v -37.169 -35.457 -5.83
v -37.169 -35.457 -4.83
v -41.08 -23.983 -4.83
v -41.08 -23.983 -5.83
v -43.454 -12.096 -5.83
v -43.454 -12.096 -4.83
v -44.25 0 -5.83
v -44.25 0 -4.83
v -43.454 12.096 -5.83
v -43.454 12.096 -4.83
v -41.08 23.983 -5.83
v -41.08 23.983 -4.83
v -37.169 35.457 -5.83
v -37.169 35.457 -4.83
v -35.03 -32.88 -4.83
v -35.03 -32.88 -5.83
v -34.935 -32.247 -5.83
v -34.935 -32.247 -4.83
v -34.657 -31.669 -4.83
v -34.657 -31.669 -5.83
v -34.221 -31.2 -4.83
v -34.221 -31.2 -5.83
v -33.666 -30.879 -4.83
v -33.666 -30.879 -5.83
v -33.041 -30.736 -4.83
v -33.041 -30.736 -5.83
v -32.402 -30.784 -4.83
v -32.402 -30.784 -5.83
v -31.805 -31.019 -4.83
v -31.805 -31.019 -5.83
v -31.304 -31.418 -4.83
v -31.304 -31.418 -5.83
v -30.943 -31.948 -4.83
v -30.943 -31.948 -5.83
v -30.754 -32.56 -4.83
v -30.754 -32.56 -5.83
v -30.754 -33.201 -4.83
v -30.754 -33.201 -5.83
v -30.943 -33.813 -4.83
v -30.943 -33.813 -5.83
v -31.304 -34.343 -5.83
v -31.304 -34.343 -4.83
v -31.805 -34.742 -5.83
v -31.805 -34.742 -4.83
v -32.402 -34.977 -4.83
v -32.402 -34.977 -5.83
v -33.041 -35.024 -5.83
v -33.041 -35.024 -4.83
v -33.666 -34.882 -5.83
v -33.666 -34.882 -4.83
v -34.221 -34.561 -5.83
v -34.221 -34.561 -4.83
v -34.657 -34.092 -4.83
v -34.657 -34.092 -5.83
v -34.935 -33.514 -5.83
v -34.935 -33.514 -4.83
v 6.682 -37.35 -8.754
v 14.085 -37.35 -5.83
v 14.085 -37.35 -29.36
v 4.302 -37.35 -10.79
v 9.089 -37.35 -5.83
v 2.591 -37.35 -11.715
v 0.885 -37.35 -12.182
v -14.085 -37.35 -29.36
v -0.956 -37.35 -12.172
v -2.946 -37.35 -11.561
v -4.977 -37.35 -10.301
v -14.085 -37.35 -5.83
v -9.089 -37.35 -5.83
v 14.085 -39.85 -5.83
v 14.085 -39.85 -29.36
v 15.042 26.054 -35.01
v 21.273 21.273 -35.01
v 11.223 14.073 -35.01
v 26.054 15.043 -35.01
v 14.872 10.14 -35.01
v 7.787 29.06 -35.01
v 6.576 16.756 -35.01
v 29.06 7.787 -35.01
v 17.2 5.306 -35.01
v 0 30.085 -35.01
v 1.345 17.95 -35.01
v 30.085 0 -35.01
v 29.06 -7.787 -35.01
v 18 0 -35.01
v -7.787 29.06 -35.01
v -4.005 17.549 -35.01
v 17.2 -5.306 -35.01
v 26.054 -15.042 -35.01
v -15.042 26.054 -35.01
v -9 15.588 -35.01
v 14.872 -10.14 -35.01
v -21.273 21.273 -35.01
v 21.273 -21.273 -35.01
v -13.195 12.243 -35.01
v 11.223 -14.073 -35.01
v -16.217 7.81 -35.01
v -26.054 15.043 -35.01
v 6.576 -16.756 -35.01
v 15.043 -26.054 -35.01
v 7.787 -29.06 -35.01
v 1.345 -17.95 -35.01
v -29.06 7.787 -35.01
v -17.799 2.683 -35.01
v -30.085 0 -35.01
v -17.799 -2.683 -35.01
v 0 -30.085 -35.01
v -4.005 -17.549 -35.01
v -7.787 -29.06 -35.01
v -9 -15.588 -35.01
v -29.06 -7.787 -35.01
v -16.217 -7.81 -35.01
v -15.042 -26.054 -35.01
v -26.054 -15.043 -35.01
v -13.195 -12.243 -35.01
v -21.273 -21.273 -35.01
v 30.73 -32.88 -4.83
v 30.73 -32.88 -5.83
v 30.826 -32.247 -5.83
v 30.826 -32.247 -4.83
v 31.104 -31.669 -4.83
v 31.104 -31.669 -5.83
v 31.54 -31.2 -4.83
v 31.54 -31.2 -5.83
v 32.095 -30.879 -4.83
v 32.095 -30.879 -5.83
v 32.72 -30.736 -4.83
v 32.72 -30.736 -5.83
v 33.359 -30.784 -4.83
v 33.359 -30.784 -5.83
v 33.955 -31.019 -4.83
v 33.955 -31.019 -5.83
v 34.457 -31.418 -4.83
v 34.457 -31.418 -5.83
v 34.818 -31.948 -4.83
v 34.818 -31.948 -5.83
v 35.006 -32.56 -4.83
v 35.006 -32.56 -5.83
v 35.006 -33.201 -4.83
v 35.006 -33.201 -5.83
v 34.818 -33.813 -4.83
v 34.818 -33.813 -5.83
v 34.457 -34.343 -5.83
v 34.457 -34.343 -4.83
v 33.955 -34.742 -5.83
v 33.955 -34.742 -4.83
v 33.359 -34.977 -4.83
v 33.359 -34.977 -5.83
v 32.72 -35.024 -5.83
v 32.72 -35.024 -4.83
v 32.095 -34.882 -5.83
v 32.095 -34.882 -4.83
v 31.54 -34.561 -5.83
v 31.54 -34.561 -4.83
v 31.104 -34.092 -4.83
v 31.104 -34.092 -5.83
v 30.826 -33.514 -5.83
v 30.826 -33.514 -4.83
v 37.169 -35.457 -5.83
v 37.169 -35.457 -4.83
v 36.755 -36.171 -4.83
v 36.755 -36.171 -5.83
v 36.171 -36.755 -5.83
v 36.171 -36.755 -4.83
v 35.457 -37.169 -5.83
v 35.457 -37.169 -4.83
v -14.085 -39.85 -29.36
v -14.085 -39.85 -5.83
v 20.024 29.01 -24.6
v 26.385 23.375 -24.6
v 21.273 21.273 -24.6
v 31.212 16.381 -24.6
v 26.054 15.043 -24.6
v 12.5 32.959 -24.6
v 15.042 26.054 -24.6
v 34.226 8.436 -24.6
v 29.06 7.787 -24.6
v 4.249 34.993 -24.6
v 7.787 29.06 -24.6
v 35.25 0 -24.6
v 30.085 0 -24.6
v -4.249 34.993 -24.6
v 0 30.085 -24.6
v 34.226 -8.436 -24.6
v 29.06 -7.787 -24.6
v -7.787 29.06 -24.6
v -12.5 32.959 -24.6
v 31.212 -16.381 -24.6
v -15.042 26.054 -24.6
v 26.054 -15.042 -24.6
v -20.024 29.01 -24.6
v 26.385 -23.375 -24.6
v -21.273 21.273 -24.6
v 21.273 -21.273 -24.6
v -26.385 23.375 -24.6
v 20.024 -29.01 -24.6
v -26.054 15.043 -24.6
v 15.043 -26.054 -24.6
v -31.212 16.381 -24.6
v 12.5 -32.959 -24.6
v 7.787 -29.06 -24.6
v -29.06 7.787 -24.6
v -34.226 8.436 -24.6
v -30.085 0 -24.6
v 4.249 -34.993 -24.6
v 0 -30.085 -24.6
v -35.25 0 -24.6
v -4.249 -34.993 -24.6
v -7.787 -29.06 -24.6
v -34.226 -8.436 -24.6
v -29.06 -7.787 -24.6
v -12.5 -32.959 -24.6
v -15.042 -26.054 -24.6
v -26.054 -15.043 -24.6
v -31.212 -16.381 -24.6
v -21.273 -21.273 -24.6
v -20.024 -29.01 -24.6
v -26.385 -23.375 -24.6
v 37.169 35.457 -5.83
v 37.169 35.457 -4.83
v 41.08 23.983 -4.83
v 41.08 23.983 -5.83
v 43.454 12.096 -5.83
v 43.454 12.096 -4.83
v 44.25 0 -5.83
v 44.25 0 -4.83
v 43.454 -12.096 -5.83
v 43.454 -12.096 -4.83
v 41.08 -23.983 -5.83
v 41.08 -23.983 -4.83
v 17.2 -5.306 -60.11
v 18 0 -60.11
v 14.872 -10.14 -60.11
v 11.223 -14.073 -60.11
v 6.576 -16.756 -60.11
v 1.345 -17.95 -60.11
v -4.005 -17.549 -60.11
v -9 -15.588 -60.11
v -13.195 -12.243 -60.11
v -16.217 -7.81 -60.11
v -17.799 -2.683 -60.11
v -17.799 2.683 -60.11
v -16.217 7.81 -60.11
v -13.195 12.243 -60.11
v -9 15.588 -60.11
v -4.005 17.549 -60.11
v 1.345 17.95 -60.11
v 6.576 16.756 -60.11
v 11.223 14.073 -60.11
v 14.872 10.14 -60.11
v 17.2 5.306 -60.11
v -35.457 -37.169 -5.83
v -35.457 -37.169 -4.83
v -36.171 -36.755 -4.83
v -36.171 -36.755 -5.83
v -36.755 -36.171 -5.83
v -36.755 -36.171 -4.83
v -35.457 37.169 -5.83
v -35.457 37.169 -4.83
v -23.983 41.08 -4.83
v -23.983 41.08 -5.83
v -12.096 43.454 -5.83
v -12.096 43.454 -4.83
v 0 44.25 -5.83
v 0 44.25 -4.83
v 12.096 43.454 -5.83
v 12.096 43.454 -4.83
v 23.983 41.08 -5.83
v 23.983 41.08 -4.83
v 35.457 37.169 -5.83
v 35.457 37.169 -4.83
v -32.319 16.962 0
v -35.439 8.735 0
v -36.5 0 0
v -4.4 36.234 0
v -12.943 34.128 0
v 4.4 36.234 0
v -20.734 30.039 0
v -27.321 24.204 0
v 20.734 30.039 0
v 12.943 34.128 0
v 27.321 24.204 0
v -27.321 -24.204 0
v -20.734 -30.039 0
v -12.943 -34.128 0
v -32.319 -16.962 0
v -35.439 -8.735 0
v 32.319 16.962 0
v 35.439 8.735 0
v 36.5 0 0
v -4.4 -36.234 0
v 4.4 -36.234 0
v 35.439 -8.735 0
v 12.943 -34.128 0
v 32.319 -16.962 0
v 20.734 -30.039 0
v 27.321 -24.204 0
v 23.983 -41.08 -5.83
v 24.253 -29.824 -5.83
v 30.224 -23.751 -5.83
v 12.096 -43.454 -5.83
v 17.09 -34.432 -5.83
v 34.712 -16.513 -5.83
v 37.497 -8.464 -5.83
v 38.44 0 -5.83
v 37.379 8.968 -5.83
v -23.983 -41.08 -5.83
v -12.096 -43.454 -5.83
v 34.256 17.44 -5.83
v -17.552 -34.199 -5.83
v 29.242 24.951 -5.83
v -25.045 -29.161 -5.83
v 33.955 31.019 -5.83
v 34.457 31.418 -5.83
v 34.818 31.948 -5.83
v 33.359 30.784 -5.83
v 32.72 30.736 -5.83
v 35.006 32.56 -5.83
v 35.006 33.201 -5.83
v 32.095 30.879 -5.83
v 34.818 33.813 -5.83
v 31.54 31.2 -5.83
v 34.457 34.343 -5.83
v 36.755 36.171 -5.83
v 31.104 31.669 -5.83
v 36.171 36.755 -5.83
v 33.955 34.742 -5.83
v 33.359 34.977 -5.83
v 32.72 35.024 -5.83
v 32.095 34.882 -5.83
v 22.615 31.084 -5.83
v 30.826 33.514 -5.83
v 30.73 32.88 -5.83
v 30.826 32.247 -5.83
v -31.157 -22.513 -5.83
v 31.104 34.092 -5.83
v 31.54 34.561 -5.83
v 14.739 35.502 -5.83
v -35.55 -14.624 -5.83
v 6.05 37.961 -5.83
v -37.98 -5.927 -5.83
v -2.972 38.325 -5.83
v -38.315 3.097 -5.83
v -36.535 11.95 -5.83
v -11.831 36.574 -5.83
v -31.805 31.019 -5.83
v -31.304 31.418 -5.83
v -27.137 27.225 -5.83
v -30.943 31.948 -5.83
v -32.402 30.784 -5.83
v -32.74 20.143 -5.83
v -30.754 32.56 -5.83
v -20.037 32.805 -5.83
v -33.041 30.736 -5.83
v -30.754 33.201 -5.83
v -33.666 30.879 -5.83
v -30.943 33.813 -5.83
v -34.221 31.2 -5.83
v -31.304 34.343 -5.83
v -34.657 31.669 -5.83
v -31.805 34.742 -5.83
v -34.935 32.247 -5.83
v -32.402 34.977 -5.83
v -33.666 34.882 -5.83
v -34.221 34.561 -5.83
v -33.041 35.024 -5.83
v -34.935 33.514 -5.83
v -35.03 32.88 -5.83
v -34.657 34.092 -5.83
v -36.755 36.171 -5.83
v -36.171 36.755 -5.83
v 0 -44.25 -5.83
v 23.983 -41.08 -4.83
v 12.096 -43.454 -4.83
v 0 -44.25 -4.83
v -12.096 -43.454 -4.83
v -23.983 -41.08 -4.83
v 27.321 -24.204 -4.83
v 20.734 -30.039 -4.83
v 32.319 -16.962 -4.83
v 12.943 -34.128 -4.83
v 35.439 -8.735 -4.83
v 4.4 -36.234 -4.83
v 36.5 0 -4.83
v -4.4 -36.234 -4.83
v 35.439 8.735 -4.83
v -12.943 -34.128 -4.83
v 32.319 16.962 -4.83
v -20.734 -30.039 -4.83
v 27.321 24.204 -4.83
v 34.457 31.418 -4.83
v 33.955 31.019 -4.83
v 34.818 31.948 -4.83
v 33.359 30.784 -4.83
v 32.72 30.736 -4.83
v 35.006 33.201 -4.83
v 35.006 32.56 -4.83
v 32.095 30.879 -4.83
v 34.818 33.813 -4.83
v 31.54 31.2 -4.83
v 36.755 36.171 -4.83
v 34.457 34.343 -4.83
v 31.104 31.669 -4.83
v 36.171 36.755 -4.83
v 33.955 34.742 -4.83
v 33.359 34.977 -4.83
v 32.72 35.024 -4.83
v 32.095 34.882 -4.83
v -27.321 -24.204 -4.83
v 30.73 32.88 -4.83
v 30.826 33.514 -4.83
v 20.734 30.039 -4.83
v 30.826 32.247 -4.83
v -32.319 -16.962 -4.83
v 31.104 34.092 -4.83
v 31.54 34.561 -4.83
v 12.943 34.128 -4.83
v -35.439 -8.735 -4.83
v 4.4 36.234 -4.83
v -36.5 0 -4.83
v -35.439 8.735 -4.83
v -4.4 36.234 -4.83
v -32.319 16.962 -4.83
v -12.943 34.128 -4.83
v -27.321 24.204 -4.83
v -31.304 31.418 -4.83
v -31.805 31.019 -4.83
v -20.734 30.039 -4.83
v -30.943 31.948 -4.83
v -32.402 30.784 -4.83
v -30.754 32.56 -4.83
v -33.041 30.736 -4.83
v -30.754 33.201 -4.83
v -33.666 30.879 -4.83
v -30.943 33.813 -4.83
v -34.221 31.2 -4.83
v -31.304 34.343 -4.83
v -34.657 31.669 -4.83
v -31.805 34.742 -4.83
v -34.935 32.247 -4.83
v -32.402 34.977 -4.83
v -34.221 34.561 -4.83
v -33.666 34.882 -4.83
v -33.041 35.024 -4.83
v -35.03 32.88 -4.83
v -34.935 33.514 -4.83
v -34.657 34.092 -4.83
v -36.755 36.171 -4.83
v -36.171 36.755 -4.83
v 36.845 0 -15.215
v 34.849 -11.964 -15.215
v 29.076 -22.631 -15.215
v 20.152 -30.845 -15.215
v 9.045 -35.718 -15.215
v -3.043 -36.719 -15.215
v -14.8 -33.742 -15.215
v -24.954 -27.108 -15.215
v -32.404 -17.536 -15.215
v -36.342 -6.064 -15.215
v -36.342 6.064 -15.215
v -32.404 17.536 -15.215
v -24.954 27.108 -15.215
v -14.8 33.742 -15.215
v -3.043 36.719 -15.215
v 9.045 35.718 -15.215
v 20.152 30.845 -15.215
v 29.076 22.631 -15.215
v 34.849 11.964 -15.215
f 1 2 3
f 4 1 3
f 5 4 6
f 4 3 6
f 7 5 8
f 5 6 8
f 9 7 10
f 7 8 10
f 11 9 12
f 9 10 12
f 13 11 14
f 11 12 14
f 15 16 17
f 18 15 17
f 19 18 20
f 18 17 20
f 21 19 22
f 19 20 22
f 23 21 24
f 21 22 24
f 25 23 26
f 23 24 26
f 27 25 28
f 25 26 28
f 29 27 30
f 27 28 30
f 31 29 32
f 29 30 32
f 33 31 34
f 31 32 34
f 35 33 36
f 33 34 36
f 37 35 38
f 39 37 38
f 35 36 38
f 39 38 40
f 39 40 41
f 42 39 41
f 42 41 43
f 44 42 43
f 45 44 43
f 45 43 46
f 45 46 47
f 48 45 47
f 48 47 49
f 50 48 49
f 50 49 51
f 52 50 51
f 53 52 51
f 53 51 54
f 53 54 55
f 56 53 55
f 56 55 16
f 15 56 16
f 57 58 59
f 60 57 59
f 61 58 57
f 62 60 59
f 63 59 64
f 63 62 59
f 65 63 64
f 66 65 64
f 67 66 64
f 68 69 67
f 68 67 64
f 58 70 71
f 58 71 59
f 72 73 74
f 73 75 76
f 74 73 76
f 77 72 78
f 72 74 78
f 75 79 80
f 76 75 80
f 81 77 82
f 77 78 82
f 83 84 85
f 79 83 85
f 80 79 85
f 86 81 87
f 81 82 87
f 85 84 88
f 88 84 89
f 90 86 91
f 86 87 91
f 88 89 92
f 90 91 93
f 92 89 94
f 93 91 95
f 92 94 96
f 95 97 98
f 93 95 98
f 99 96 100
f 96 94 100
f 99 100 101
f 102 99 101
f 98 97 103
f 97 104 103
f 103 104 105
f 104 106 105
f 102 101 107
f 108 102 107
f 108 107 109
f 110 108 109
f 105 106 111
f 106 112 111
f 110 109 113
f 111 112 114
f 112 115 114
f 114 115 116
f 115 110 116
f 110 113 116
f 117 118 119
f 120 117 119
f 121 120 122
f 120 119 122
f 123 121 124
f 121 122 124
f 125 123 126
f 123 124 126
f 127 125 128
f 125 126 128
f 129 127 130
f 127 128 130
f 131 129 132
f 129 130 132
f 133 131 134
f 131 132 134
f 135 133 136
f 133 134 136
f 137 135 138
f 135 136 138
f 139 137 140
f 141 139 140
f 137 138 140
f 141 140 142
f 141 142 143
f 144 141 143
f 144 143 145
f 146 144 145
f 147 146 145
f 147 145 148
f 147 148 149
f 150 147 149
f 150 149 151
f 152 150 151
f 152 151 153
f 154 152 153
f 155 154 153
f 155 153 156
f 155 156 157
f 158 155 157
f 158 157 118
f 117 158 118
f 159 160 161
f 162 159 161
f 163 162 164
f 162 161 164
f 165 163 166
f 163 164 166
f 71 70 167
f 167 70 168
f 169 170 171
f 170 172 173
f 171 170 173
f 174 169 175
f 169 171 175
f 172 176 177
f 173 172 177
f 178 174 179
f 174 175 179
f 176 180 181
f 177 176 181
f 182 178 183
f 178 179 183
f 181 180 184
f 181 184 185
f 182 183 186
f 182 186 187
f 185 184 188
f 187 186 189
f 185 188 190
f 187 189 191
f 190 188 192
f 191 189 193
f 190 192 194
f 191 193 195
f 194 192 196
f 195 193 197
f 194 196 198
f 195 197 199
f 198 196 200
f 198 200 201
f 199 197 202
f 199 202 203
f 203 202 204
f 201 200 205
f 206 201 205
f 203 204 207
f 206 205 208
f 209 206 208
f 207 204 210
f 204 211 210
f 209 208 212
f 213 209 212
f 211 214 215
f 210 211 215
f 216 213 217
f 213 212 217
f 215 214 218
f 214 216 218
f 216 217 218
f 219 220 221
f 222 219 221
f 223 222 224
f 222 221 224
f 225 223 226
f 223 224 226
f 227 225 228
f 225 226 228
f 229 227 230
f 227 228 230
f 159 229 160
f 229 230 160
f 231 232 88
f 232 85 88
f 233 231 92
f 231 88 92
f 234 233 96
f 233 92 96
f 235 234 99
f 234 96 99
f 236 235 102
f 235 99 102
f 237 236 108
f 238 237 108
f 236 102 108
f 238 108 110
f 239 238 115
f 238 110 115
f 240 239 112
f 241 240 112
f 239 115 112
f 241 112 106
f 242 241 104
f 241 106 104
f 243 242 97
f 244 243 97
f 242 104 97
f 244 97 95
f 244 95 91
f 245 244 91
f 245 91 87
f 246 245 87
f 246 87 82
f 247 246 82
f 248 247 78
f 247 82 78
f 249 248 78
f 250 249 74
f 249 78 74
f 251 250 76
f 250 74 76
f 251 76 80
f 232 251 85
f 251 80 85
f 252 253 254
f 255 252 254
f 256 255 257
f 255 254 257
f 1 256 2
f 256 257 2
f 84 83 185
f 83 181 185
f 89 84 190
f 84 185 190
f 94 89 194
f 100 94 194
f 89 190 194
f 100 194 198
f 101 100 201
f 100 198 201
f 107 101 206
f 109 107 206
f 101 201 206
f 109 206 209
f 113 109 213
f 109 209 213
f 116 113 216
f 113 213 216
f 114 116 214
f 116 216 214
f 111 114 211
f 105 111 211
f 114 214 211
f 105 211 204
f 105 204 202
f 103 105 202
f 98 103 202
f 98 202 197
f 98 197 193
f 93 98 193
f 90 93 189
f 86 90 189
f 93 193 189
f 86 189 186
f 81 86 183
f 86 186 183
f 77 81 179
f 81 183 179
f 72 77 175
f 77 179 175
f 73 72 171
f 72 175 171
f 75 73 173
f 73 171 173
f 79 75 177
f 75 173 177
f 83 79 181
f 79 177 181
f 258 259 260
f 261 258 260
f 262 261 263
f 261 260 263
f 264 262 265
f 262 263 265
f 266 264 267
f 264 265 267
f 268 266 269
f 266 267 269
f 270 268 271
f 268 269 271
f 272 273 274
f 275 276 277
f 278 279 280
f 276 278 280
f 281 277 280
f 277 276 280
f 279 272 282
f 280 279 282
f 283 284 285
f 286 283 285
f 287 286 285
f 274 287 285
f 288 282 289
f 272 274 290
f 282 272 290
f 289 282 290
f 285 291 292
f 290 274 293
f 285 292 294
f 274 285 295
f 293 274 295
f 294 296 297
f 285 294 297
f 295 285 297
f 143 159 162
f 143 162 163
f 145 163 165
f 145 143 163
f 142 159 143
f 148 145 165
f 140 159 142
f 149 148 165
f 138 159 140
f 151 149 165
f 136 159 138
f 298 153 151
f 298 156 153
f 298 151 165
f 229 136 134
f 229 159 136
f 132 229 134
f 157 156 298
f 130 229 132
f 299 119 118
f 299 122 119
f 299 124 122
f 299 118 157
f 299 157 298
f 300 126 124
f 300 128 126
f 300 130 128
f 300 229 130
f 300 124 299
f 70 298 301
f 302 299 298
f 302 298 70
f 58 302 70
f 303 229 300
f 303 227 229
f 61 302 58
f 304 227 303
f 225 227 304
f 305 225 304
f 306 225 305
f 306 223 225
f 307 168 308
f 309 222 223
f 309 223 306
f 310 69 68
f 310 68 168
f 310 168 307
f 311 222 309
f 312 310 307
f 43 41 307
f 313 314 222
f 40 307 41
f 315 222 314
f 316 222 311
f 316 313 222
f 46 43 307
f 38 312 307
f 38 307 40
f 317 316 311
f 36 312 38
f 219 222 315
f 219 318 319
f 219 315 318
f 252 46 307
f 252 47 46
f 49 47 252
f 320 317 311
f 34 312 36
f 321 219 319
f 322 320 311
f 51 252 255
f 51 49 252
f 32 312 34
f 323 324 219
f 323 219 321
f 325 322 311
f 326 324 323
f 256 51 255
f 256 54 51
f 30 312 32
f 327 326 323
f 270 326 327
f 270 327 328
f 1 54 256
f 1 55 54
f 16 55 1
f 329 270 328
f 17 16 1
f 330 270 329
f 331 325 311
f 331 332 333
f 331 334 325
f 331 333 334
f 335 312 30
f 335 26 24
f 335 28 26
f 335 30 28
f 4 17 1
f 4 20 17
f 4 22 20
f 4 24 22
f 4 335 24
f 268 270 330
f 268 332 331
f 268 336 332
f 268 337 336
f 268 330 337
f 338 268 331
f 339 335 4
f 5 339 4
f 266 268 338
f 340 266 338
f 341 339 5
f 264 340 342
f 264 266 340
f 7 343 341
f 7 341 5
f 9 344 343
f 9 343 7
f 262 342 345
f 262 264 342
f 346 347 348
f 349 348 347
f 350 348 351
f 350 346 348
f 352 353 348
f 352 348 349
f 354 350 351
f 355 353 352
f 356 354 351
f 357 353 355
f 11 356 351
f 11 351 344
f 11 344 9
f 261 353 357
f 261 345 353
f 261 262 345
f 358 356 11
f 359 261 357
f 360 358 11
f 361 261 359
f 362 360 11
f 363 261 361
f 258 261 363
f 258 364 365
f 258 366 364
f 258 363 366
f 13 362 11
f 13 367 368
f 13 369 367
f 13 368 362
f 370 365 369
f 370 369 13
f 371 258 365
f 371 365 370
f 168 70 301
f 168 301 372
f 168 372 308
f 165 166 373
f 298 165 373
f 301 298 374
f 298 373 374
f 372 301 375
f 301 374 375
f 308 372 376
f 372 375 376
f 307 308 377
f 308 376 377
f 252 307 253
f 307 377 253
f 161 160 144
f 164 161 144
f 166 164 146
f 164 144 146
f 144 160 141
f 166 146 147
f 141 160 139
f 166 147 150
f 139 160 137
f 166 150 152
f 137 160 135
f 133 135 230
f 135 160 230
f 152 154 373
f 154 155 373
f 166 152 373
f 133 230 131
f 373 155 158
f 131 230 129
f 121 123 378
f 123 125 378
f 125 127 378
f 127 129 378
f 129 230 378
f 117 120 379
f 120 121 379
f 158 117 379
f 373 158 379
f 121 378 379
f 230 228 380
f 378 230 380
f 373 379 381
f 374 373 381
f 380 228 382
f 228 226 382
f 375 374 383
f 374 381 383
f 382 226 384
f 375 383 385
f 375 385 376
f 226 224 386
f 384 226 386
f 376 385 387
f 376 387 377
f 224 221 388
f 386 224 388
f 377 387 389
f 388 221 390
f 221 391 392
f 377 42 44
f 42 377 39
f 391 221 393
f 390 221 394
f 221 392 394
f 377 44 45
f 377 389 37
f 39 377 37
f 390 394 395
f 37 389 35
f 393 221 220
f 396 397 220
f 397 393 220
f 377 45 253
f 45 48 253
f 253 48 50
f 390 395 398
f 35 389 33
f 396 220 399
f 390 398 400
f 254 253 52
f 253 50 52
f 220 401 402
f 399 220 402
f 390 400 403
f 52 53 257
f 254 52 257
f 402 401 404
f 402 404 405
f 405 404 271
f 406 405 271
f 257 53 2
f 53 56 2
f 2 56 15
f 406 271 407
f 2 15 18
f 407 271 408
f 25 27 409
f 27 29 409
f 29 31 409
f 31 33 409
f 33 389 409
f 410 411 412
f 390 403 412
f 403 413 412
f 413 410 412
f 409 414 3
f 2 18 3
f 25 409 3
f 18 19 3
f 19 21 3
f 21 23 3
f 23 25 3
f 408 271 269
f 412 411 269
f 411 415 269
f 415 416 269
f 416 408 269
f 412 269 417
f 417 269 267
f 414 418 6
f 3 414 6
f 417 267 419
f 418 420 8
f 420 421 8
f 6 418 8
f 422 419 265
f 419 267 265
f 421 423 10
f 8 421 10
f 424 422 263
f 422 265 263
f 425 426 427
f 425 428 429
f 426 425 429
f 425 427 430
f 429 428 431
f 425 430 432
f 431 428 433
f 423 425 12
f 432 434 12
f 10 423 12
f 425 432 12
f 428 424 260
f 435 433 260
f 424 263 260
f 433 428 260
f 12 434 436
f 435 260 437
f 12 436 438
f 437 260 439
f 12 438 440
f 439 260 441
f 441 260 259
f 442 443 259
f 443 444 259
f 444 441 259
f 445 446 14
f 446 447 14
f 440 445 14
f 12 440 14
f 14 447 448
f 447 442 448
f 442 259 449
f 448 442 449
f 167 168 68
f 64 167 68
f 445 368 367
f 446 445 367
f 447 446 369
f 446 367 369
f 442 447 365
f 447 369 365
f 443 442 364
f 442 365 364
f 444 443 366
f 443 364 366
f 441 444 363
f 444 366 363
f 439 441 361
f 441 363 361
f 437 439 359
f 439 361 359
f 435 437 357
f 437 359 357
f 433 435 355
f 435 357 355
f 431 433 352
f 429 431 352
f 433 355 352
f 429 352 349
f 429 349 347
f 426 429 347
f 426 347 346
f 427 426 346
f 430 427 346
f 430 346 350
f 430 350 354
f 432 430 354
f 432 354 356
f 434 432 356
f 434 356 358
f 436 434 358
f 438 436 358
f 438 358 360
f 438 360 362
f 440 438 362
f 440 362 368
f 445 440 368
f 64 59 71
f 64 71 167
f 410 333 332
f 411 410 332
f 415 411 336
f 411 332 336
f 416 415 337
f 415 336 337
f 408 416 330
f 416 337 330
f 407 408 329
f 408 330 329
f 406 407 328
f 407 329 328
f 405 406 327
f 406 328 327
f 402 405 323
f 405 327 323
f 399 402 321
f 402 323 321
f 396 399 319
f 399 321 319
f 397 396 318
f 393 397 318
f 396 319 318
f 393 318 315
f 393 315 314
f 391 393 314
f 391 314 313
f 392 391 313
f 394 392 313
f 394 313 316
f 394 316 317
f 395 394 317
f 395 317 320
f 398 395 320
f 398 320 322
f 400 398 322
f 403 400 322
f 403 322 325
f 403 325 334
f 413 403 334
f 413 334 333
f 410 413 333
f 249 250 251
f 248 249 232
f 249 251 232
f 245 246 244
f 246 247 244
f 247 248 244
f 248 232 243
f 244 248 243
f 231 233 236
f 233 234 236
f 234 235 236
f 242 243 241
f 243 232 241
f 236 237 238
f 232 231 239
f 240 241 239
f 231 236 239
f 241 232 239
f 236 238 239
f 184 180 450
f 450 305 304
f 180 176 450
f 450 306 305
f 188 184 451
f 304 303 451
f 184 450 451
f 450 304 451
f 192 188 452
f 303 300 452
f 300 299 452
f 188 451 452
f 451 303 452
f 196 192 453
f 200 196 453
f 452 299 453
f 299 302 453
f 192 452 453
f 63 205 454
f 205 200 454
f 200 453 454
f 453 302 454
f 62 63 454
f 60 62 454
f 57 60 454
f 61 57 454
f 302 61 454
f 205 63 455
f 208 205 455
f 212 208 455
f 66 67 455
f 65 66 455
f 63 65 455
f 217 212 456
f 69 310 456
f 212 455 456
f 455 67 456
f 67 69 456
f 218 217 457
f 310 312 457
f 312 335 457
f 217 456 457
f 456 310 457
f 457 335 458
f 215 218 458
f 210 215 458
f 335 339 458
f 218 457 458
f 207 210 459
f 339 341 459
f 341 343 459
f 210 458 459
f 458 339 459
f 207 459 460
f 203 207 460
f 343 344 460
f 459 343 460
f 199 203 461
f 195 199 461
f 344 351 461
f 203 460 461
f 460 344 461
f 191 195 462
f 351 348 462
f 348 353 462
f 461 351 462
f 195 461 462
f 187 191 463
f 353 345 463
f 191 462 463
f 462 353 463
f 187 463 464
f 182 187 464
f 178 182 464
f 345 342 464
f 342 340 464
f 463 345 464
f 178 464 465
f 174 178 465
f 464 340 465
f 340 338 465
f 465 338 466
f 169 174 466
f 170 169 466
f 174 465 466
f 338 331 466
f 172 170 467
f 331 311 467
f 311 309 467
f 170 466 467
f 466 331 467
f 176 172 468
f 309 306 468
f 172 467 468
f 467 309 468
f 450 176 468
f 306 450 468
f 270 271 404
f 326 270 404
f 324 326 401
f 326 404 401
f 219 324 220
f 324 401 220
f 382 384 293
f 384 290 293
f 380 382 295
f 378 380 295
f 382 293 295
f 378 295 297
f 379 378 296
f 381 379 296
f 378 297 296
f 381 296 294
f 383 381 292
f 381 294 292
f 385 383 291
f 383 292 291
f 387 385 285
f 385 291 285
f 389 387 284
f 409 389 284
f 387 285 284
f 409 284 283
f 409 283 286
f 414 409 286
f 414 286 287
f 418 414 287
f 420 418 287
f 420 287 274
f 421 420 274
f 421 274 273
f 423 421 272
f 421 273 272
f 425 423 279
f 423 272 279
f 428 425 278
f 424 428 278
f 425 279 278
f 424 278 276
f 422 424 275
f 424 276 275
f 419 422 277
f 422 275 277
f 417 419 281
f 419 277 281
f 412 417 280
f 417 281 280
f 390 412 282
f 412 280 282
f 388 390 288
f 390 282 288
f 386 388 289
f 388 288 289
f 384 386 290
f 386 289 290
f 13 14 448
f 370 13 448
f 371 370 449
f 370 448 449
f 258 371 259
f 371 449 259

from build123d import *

# Parameters (mm, degrees)
BOSS_EXTRUDE1_DEPTH        = 1
F_4_3_4_3_DIAMETER_HOLE1_D = 4.3
SKETCH6_W                  = 28.17
SKETCH6_H                  = 2.5
BOSS_EXTRUDE2_DEPTH        = 23.53


with BuildPart() as part:
    # Sketch1 → Revolve1 (revolve)
    with BuildSketch(Plane(origin=(0, 0, 0), x_dir=(0, 0, -1), z_dir=(1, 0, 0)), mode=Mode.PRIVATE) as revolve1_sk:
        Polygon((60.11, 0), (60.11, 18), (35.01, 18), (35.01, 30.085), (24.6, 30.085), (24.6, 35.25), (5.83, 38.44), (5.83, 44.25), (4.83, 44.25), (4.83, 36.5), (0, 36.5), (0, 0), align=None)
    revolve(revolve1_sk.sketch.rotate(Axis((0, 0, 0), (0, 0, -1)), 90), axis=Axis((0, 0, 0), (0, 0, -1)))

    # Sketch2 → Boss-Extrude1 (add)
    with BuildSketch(Plane.XY.offset(-4.83)):
        with BuildLine():
            ThreePointArc((-35.456787888, 37.168658693), (0, 44.25), (35.456787888, 37.168658693))
            ThreePointArc((35.456787888, 37.168658693), (36.482290492, 36.482290492), (37.168658693, 35.456787888))
            ThreePointArc((37.168658693, 35.456787888), (44.25, 0), (37.168658693, -35.456787888))
            ThreePointArc((37.168658693, -35.456787888), (36.482290492, -36.482290492), (35.456787888, -37.168658693))
            ThreePointArc((35.456787888, -37.168658693), (0, -44.25), (-35.456787888, -37.168658693))
            ThreePointArc((-35.456787888, -37.168658693), (-36.482290492, -36.482290492), (-37.168658693, -35.456787888))
            ThreePointArc((-37.168658693, -35.456787888), (-44.25, 0), (-37.168658693, 35.456787888))
            ThreePointArc((-37.168658693, 35.456787888), (-36.482290492, 36.482290492), (-35.456787888, 37.168658693))
        make_face()
    extrude(amount=-BOSS_EXTRUDE1_DEPTH)

    # Ø4.3 (4.3) Diameter Hole1 (through all)
    with Locations(Plane.XY.offset(-4.83)):
        with Locations((-32.880465325, 32.880465325), (32.880465325, 32.880465325), (32.880465325, -32.880465325), (-32.880465325, -32.880465325)):
            Hole(F_4_3_4_3_DIAMETER_HOLE1_D / 2)

    # Sketch6 → Boss-Extrude2 (add)
    with BuildSketch(Plane(origin=(0, 0, -5.83), x_dir=(-1, 0, 0), z_dir=(0, 0, -1))):
        with Locations((0, -38.6)):
            Rectangle(SKETCH6_W, SKETCH6_H)
    extrude(amount=BOSS_EXTRUDE2_DEPTH)


solid = part.part
